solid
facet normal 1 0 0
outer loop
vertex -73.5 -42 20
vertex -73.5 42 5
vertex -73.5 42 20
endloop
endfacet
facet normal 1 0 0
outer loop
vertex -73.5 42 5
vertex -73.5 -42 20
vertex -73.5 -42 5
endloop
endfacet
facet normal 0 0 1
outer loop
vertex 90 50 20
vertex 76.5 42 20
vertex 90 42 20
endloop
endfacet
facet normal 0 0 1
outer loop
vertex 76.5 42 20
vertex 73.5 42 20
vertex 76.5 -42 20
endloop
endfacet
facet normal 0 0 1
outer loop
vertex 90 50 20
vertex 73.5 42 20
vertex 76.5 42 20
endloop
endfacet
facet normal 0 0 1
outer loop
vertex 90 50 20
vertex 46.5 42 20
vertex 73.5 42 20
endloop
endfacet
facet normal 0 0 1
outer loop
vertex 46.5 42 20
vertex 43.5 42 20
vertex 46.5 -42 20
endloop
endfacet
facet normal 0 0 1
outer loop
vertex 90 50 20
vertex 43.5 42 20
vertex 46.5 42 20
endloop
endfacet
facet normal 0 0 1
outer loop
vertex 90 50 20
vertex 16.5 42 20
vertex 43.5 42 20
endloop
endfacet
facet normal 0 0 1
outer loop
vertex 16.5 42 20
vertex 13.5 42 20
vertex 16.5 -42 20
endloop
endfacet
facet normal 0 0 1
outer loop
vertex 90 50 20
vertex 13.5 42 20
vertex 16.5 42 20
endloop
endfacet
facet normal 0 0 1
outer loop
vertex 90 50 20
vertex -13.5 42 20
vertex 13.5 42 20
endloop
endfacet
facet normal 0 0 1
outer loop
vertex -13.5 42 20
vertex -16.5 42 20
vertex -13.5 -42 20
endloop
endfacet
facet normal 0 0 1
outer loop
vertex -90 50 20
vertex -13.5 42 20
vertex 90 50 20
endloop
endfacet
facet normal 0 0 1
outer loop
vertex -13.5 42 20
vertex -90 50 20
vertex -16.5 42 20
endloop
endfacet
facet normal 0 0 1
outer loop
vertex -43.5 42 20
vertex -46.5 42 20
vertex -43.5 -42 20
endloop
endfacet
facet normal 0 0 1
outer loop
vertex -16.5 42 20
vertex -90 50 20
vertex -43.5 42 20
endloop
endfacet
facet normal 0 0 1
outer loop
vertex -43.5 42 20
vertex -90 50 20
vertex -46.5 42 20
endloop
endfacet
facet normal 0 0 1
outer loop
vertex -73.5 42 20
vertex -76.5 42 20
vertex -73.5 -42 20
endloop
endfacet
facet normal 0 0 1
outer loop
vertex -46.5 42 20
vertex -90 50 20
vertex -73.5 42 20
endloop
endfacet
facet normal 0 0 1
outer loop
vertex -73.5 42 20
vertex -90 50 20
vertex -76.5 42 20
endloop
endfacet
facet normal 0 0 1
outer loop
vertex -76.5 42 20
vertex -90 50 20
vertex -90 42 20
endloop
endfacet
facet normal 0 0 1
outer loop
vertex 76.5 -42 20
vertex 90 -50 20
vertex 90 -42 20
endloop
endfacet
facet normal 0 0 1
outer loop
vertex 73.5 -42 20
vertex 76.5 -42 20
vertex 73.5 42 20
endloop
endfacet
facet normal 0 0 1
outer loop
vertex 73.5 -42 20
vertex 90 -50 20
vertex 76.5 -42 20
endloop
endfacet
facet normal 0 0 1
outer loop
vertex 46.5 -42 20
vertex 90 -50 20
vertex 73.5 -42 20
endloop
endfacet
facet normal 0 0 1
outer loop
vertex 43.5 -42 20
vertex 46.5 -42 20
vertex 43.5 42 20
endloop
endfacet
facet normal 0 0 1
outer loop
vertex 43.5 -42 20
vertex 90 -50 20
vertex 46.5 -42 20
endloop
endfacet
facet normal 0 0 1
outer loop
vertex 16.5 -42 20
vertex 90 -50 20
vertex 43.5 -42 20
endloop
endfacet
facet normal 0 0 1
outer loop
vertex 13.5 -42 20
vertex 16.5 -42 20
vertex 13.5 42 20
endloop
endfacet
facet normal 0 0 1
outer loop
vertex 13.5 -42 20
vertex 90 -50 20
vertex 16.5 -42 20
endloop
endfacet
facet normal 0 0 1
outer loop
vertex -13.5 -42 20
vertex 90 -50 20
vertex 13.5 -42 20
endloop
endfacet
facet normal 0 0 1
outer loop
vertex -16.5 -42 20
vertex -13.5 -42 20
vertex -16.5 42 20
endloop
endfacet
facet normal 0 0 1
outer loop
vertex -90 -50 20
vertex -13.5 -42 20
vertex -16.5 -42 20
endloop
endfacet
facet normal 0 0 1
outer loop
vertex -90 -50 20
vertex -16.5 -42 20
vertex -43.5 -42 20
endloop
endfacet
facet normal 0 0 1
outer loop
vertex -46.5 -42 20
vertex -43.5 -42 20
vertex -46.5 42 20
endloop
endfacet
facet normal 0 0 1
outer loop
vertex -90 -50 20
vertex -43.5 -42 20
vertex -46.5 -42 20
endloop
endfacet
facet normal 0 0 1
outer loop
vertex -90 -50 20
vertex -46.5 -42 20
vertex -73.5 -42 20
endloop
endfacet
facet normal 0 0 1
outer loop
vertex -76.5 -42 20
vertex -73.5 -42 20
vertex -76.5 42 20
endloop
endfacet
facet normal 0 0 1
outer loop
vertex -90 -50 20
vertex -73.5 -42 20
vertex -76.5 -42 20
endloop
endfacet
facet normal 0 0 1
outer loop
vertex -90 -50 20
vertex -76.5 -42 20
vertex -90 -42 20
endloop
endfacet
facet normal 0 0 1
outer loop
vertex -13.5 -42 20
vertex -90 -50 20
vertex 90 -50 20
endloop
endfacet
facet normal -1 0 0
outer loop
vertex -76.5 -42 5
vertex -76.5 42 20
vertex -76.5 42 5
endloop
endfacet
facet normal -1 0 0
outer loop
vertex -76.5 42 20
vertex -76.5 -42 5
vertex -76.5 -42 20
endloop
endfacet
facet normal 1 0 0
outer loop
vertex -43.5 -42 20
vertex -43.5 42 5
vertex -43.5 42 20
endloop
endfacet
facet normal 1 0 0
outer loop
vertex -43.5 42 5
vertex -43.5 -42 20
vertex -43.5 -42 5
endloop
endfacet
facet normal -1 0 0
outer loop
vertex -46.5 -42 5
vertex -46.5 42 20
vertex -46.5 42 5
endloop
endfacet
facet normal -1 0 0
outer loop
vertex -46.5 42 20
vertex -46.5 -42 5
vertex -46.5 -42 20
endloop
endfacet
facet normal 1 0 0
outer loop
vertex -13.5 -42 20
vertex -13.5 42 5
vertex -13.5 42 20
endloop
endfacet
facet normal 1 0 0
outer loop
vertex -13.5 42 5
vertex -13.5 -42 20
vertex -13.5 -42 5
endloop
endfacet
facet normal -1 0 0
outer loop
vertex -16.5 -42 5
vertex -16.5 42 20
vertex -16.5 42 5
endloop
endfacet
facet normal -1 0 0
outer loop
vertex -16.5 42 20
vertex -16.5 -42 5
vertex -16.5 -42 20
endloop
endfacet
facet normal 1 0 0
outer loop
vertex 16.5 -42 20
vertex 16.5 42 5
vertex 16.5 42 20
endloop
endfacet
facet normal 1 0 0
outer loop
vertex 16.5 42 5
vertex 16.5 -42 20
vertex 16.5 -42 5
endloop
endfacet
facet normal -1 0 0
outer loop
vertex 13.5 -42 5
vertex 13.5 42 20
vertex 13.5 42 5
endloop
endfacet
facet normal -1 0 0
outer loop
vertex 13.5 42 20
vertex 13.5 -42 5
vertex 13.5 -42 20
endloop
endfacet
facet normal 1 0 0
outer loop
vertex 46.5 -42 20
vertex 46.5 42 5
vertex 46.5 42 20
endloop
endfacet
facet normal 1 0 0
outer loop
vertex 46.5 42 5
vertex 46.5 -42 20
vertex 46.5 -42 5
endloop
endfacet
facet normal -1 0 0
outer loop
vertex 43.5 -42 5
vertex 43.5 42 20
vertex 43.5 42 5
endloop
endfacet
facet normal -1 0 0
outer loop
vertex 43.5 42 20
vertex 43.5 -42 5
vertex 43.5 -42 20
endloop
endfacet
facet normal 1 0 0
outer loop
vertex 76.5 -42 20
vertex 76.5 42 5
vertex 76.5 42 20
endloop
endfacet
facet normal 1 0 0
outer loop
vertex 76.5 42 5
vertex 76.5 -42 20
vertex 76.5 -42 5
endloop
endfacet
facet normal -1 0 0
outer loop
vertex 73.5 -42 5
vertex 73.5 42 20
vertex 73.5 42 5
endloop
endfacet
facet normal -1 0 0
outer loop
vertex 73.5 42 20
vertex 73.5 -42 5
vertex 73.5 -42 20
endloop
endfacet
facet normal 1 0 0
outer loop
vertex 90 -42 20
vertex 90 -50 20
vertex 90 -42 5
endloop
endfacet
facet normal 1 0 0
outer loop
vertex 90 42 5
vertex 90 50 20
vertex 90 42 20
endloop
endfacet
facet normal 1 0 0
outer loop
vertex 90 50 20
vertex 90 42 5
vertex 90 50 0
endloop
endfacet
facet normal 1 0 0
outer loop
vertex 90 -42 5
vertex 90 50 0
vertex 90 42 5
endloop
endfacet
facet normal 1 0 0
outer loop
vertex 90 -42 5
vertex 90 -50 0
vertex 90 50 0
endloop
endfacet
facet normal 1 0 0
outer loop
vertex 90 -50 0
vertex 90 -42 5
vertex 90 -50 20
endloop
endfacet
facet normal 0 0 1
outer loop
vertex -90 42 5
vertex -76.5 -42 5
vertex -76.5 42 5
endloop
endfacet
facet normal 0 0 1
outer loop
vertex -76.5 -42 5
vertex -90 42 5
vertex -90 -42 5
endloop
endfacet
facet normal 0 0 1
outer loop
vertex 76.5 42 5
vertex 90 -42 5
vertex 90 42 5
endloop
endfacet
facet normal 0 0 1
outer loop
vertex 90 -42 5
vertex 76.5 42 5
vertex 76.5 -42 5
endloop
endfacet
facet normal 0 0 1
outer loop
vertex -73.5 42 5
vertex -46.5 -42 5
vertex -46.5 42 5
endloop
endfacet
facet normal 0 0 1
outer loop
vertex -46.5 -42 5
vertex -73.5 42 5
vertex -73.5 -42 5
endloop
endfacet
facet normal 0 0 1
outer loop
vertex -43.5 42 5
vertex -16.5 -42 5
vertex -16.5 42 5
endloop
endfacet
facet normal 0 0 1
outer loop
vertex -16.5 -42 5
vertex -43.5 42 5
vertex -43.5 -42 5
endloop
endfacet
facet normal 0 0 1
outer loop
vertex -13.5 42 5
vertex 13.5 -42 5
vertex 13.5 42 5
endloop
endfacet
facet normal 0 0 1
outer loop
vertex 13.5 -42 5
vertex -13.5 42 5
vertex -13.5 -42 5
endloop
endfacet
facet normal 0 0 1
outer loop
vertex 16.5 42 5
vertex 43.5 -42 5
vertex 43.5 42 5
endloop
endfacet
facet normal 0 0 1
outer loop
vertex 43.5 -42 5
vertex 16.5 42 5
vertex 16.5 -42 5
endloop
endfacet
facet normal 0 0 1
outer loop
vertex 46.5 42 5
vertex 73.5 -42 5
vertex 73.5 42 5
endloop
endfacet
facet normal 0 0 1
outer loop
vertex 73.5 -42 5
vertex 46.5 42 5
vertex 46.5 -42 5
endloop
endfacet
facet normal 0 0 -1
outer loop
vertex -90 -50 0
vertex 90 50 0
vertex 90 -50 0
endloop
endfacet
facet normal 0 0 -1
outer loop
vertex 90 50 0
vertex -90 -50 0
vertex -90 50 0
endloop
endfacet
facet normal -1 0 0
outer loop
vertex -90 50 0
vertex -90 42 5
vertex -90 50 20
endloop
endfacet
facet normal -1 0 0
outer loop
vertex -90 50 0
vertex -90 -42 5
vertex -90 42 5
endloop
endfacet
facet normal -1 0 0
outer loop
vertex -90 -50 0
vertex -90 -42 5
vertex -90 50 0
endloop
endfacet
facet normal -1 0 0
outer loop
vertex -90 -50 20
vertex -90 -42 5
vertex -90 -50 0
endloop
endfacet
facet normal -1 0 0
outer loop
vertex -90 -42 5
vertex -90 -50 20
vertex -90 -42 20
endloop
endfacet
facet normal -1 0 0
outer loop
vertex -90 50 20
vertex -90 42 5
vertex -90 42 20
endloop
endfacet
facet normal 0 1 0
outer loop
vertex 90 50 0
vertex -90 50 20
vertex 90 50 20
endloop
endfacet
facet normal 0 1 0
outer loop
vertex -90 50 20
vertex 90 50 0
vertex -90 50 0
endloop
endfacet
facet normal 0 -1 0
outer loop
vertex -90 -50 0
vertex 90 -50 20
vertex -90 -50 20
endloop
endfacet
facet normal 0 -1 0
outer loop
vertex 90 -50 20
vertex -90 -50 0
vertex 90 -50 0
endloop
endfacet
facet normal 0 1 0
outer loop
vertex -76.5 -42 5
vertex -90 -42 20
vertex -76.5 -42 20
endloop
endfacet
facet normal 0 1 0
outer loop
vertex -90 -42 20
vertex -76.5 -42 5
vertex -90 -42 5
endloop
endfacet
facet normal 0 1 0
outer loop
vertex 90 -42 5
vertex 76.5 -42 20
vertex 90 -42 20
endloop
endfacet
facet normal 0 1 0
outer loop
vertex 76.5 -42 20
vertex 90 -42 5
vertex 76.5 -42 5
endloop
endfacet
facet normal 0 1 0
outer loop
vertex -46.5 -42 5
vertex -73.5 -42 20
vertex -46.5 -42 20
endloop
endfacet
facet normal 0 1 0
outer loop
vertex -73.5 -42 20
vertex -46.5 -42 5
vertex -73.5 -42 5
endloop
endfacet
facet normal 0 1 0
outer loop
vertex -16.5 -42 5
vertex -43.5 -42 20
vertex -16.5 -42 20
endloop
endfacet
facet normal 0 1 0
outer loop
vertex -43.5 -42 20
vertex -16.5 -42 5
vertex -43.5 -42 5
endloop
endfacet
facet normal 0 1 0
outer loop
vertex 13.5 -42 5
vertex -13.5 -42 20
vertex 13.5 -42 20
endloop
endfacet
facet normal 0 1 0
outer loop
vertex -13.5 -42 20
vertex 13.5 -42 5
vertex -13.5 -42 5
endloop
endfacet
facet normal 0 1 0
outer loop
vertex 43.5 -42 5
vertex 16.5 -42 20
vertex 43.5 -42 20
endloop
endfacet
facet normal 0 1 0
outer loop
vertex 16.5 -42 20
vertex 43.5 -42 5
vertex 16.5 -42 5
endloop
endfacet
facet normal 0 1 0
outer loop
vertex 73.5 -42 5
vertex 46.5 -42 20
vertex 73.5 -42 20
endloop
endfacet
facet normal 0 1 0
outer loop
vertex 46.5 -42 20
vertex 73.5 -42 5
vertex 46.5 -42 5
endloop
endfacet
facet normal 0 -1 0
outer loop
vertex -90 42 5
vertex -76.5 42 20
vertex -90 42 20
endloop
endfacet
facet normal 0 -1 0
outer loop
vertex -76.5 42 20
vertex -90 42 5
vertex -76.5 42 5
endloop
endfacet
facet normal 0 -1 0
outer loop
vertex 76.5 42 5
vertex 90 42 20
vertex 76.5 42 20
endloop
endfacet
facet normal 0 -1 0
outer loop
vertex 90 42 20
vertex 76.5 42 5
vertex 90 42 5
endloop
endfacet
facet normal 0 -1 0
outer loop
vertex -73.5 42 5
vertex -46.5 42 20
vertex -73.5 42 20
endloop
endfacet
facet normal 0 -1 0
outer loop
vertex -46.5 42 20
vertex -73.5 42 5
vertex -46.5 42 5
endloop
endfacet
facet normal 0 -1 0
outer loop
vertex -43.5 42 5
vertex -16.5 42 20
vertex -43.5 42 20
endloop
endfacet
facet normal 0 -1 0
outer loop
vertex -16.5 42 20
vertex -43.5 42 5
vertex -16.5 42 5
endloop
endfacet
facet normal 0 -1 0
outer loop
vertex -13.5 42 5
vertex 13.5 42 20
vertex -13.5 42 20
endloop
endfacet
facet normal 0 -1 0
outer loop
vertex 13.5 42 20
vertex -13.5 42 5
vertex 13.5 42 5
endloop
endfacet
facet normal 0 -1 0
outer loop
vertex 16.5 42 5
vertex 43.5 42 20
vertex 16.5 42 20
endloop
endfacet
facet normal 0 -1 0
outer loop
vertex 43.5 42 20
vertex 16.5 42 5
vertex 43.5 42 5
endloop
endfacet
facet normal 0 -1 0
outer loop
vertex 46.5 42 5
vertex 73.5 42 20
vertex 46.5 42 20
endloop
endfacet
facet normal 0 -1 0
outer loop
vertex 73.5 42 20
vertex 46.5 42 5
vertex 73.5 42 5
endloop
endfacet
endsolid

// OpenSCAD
$fn = 32;

// ----------------------------------------------------------------------
// Rib frame 180 x 100 x 20
// 6 ribs at 30 mm pitch
// ----------------------------------------------------------------------

// --- parameters (mm) ---
frame = [180, 100, 5];  // base plate size (x, y, z)
rail_w = 8;             // side rail width
ribs = 6;               // number of ribs
rib_t = 3;              // rib thickness
rib_h = 15;             // rib height above the base plate
pitch = 30;             // pitch between rib centres

// --- derived feature positions (mm) ---
span = (ribs - 1) * pitch;          // = 150   distance between the outer ribs
origin_x = -span / 2;               // = -75   X of the first rib
rib_len = frame[1] - 2 * rail_w + 2;  // = 86   rib length, 1 mm into each rail
feature_centers = [
  [origin_x + 0 * pitch, 0],
  [origin_x + 1 * pitch, 0],
  [origin_x + 2 * pitch, 0],
  [origin_x + 3 * pitch, 0],
  [origin_x + 4 * pitch, 0],
  [origin_x + 5 * pitch, 0]
];   // rib centre line, drives the rib loop

// base plate, two side rails, then the ribs read straight off feature_centers
union() {
  translate([-frame[0] / 2, -frame[1] / 2, 0]) cube(frame);
  translate([-frame[0] / 2, -frame[1] / 2, 0]) cube([frame[0], rail_w, frame[2] + rib_h]);
  translate([-frame[0] / 2, frame[1] / 2 - rail_w, 0]) cube([frame[0], rail_w, frame[2] + rib_h]);
  for (centre = feature_centers)
    translate([centre[0] - rib_t / 2, centre[1] - rib_len / 2, frame[2] - 1])
      cube([rib_t, rib_len, rib_h + 1]);
}
